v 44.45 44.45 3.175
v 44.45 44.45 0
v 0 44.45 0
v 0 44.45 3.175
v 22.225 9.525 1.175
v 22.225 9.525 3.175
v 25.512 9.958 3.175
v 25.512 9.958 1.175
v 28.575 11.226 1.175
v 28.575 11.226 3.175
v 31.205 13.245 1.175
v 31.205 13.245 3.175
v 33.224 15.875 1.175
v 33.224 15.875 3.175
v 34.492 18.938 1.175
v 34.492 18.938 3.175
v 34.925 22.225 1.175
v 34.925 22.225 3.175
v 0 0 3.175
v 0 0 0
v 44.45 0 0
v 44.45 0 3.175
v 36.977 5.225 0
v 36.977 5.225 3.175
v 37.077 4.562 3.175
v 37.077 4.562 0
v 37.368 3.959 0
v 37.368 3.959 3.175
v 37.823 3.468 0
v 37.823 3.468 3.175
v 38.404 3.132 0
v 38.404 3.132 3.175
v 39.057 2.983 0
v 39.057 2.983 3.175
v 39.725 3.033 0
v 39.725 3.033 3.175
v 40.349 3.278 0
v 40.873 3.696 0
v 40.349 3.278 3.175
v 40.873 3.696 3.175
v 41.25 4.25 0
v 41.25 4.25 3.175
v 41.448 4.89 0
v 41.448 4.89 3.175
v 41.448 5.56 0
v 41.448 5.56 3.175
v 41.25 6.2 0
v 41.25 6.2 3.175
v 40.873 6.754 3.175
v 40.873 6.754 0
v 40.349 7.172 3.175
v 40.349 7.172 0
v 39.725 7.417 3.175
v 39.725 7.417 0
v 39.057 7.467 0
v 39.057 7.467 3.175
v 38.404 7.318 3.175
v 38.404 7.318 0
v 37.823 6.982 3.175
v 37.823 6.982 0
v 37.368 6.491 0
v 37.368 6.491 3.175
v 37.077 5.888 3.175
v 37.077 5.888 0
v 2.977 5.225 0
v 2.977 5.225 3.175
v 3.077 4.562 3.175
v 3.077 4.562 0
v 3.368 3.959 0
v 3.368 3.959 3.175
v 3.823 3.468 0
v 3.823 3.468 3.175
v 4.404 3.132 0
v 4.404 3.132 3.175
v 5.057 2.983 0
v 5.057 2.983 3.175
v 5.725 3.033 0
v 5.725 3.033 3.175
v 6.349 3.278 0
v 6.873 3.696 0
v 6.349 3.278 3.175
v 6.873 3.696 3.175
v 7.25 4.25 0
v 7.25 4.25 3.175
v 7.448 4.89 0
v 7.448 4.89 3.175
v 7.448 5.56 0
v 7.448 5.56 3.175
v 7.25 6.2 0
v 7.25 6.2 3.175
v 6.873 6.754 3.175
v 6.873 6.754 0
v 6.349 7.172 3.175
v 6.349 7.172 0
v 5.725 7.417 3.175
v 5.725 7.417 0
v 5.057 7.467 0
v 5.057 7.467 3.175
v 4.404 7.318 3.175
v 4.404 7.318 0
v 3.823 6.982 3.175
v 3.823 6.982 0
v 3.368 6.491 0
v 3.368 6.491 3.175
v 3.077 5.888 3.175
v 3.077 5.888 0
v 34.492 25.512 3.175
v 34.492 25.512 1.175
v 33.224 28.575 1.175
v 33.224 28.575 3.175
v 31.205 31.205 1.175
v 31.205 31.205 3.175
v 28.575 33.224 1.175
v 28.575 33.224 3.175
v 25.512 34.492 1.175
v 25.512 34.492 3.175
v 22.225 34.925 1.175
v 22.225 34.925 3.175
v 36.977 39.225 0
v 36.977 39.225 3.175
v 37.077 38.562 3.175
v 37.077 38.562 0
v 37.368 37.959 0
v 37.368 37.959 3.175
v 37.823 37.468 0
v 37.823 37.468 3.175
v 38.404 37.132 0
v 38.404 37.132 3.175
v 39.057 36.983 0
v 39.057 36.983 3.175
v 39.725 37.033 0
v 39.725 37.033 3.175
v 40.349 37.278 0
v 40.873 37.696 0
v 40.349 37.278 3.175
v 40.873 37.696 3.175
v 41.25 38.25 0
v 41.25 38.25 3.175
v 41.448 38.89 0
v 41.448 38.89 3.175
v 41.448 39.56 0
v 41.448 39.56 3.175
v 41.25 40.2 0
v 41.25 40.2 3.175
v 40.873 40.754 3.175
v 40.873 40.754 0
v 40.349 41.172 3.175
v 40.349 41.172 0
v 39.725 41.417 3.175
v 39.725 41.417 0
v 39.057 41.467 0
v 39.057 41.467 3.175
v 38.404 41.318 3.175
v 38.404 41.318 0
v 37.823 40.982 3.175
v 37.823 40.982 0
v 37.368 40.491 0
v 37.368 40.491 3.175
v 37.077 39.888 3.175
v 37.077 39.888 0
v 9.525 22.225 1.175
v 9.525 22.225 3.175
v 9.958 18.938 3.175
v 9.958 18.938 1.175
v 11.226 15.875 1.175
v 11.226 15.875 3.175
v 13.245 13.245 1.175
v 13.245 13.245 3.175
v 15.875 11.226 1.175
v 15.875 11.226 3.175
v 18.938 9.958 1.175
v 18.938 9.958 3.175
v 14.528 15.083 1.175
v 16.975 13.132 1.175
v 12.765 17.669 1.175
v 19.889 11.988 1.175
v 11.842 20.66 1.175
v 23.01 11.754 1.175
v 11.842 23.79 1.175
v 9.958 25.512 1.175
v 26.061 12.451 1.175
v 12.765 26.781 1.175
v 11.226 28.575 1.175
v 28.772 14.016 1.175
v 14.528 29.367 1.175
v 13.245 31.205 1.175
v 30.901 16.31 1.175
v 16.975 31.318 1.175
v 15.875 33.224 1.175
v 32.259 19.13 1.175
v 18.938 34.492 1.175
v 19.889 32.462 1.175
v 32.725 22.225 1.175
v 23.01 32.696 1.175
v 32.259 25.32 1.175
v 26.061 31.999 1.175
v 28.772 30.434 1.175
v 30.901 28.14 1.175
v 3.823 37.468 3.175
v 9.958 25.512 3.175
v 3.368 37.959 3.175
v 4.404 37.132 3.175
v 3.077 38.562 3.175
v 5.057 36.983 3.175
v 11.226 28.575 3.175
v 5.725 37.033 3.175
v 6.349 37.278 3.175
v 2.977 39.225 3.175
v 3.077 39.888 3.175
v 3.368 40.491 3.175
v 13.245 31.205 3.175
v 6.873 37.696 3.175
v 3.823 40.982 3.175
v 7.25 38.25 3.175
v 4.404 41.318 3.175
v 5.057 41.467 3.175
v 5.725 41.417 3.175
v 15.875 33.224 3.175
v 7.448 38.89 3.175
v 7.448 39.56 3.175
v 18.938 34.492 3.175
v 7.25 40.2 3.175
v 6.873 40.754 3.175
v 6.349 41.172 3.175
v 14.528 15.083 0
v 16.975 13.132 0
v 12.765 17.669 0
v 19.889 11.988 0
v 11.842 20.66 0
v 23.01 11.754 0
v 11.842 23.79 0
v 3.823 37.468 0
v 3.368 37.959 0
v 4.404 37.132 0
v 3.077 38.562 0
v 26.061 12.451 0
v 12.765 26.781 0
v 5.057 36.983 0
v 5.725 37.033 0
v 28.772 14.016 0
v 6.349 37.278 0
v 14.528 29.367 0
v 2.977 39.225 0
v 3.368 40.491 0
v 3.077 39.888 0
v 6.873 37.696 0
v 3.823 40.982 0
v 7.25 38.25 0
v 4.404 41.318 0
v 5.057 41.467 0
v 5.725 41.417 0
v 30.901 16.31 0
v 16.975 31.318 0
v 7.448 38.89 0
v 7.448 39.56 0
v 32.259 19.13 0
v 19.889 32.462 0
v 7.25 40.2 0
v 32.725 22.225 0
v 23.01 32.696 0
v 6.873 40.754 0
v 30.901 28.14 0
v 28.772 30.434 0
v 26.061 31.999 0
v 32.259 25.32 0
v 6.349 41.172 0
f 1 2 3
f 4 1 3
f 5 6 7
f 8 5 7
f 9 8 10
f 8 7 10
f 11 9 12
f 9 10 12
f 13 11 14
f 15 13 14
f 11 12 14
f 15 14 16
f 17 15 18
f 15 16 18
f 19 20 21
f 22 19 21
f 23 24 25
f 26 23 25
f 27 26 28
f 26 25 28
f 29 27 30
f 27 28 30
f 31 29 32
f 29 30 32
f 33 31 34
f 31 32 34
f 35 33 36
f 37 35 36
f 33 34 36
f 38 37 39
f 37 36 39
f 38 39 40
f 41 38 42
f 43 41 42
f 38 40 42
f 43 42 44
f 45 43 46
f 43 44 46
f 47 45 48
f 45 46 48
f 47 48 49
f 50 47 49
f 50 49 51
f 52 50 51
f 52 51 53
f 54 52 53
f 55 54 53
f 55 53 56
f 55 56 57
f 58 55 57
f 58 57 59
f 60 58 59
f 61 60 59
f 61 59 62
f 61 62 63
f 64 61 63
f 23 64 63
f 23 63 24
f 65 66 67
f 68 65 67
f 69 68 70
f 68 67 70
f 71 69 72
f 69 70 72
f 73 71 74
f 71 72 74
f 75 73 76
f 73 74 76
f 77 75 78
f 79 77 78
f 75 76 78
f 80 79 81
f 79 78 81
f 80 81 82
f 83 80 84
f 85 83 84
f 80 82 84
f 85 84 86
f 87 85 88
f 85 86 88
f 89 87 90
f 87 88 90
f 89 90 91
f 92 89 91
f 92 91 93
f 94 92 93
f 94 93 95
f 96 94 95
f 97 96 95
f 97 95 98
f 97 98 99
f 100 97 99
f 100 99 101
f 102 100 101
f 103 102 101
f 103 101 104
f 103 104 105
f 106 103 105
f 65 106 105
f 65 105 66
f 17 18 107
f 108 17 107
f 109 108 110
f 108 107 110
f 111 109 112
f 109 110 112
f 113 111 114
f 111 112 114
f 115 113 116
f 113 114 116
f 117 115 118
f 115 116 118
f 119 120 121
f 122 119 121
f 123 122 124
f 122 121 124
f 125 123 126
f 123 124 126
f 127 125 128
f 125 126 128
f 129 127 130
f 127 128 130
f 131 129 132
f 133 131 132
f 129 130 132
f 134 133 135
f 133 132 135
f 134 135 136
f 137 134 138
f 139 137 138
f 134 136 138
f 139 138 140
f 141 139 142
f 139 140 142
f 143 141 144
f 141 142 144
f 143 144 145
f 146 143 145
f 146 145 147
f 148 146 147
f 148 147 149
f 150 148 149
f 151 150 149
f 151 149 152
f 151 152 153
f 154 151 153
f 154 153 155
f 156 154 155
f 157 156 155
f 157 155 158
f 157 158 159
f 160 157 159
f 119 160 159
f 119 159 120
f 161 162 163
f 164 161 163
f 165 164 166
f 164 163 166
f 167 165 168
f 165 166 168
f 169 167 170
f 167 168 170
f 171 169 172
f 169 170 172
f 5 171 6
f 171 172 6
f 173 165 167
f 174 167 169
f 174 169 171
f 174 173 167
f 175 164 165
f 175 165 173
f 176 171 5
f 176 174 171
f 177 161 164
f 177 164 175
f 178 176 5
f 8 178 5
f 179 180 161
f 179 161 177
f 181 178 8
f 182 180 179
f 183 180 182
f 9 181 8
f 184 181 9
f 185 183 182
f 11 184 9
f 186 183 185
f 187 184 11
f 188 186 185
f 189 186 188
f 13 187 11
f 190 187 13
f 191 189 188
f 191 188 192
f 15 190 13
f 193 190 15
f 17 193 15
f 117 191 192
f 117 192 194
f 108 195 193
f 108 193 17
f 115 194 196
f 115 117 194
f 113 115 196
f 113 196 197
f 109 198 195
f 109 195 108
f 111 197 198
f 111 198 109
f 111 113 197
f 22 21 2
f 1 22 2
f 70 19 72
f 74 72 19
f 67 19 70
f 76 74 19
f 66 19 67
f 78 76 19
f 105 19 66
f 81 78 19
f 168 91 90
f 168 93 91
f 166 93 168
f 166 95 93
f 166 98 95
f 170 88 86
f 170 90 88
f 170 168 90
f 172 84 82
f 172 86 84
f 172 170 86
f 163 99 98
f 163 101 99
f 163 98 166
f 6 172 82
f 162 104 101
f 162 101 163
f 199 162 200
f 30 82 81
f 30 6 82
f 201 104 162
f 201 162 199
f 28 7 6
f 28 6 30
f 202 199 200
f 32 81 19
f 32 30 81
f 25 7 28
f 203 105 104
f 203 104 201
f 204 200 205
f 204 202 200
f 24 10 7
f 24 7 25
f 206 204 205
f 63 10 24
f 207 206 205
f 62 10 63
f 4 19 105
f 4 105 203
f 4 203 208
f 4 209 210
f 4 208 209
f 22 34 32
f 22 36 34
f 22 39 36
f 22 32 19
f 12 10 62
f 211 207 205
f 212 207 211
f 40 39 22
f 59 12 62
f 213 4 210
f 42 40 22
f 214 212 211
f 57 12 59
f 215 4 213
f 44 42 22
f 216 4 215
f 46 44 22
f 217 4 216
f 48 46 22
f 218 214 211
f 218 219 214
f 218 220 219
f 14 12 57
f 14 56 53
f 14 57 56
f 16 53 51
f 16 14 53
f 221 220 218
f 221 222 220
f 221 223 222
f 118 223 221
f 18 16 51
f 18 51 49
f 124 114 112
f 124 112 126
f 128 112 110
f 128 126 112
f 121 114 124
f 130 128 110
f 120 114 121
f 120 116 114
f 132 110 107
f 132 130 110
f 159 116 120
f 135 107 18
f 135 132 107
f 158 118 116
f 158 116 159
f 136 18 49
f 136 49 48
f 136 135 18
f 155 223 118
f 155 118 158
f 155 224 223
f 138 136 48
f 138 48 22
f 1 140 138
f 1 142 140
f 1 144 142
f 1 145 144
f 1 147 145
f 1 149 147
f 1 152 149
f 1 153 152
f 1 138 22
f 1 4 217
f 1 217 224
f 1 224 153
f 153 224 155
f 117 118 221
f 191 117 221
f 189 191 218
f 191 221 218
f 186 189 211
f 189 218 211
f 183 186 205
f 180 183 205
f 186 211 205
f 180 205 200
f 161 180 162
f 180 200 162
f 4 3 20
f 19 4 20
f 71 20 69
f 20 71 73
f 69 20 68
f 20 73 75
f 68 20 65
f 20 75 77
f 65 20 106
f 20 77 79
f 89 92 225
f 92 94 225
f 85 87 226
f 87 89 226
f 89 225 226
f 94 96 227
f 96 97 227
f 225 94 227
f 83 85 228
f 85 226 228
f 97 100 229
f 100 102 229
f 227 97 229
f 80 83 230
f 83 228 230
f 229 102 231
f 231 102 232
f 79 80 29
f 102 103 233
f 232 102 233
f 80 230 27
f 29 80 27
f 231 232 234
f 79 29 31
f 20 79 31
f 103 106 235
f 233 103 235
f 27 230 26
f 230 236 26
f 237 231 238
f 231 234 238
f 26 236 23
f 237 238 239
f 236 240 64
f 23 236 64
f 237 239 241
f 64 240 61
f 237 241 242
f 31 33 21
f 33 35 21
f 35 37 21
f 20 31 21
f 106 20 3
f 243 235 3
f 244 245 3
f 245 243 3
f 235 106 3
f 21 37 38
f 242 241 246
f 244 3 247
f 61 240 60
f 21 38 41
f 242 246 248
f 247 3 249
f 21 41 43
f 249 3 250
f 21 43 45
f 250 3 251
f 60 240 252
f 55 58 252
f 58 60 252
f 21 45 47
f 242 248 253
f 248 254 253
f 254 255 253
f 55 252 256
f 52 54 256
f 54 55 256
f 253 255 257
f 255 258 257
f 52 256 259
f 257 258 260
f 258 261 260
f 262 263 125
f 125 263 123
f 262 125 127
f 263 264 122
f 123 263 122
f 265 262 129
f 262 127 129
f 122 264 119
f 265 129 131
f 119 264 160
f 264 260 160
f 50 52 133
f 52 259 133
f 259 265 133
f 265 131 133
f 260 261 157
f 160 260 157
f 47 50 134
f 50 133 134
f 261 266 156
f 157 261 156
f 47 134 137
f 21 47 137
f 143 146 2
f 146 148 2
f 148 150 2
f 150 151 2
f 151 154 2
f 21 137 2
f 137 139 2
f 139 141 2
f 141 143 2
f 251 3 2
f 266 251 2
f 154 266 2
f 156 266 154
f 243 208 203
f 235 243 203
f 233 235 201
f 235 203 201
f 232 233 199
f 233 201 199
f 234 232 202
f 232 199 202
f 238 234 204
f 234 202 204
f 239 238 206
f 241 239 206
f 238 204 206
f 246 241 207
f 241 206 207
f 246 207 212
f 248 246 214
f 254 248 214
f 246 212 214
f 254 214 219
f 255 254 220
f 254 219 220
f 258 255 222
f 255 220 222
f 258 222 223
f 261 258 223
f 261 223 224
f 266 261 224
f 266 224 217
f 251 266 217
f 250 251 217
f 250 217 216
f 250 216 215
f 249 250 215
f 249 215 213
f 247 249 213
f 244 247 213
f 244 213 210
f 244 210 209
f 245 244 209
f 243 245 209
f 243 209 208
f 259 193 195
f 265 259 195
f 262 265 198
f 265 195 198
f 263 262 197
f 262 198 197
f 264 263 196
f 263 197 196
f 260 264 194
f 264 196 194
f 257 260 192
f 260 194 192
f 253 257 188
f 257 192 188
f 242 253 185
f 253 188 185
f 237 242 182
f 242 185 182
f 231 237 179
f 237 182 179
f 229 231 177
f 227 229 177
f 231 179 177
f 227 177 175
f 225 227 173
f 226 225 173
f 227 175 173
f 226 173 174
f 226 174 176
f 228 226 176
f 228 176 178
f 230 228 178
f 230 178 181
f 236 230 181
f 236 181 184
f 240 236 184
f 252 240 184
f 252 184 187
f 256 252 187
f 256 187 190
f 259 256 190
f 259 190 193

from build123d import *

# Parameters (mm, degrees)
F0_W     = 5.225
F0_H     = 5.225
F0_W_2   = 34
F0_H_2   = 34
F1_DEPTH = 3.175
F2_D     = 4.4958
F2_DEPTH = 45.72
F2_TIP   = 1.3506745855
F4_DEPTH = 2
F5_R     = 10.5
F6_DEPTH = 1.176


with BuildPart() as f1:
    # F0 (on Top) → F1 (new body)
    with BuildSketch(Plane.XY):
        Polygon((0, 39.225), (0, 0), (39.225, 0), (39.225, 5.225), (5.225, 5.225), (5.225, 39.225), align=None)
        with Locations((41.8375, 2.6125)):
            Rectangle(F0_W, F0_H)
        with Locations((2.6125, 41.8375)):
            Rectangle(F0_W, F0_H)
        Polygon((39.225, 39.225), (39.225, 5.225), (44.45, 5.225), (44.45, 44.45), (5.225, 44.45), (5.225, 39.225), align=None)
        with Locations((22.225, 22.225)):
            Rectangle(F0_W_2, F0_H_2)
    extrude(amount=F1_DEPTH)

    # F2
    with Locations(Plane(origin=(0, 0, 0), x_dir=(1, 0, 0), z_dir=(0, 0, -1))):
        with Locations((5.225, -39.225), (39.225, -39.225), (39.225, -5.225), (5.225, -5.225)):
            Hole(F2_D / 2, depth=F2_DEPTH)
            with Locations((0, 0, -(F2_DEPTH + F2_TIP / 2))):  # 118° drill point
                Cone(0, F2_D / 2, F2_TIP, mode=Mode.SUBTRACT)

    # F3 (on face) → F4 (cut)
    with BuildSketch(Plane.XY.offset(3.175)):
        with BuildLine():
            ThreePointArc((34.925, 22.225), (31.2052561211, 31.2052561211), (22.225, 34.925))
            Line((22.225, 34.925), (22.225, 22.225))
            Line((22.225, 22.225), (34.925, 22.225))
        make_face()
        with BuildLine():
            Line((22.225, 22.225), (22.225, 34.925))
            ThreePointArc((22.225, 34.925), (13.2447438789, 31.2052561211), (9.525, 22.225))
            Line((9.525, 22.225), (22.225, 22.225))
        make_face()
        with BuildLine():
            Line((34.925, 22.225), (22.225, 22.225))
            Line((22.225, 22.225), (22.225, 9.525))
            ThreePointArc((22.225, 9.525), (31.2052561211, 13.2447438789), (34.925, 22.225))
        make_face()
        with BuildLine():
            Line((22.225, 9.525), (22.225, 22.225))
            Line((22.225, 22.225), (9.525, 22.225))
            ThreePointArc((9.525, 22.225), (13.2447438789, 13.2447438789), (22.225, 9.525))
        make_face()
    extrude(amount=-F4_DEPTH, mode=Mode.SUBTRACT)

    # F5 (on face) → F6 (cut, through all)
    with BuildSketch(Plane.XY.offset(1.175)):
        with Locations((22.225, 22.225)):
            Circle(F5_R)
    extrude(amount=-F6_DEPTH, mode=Mode.SUBTRACT)


solid = f1.part
